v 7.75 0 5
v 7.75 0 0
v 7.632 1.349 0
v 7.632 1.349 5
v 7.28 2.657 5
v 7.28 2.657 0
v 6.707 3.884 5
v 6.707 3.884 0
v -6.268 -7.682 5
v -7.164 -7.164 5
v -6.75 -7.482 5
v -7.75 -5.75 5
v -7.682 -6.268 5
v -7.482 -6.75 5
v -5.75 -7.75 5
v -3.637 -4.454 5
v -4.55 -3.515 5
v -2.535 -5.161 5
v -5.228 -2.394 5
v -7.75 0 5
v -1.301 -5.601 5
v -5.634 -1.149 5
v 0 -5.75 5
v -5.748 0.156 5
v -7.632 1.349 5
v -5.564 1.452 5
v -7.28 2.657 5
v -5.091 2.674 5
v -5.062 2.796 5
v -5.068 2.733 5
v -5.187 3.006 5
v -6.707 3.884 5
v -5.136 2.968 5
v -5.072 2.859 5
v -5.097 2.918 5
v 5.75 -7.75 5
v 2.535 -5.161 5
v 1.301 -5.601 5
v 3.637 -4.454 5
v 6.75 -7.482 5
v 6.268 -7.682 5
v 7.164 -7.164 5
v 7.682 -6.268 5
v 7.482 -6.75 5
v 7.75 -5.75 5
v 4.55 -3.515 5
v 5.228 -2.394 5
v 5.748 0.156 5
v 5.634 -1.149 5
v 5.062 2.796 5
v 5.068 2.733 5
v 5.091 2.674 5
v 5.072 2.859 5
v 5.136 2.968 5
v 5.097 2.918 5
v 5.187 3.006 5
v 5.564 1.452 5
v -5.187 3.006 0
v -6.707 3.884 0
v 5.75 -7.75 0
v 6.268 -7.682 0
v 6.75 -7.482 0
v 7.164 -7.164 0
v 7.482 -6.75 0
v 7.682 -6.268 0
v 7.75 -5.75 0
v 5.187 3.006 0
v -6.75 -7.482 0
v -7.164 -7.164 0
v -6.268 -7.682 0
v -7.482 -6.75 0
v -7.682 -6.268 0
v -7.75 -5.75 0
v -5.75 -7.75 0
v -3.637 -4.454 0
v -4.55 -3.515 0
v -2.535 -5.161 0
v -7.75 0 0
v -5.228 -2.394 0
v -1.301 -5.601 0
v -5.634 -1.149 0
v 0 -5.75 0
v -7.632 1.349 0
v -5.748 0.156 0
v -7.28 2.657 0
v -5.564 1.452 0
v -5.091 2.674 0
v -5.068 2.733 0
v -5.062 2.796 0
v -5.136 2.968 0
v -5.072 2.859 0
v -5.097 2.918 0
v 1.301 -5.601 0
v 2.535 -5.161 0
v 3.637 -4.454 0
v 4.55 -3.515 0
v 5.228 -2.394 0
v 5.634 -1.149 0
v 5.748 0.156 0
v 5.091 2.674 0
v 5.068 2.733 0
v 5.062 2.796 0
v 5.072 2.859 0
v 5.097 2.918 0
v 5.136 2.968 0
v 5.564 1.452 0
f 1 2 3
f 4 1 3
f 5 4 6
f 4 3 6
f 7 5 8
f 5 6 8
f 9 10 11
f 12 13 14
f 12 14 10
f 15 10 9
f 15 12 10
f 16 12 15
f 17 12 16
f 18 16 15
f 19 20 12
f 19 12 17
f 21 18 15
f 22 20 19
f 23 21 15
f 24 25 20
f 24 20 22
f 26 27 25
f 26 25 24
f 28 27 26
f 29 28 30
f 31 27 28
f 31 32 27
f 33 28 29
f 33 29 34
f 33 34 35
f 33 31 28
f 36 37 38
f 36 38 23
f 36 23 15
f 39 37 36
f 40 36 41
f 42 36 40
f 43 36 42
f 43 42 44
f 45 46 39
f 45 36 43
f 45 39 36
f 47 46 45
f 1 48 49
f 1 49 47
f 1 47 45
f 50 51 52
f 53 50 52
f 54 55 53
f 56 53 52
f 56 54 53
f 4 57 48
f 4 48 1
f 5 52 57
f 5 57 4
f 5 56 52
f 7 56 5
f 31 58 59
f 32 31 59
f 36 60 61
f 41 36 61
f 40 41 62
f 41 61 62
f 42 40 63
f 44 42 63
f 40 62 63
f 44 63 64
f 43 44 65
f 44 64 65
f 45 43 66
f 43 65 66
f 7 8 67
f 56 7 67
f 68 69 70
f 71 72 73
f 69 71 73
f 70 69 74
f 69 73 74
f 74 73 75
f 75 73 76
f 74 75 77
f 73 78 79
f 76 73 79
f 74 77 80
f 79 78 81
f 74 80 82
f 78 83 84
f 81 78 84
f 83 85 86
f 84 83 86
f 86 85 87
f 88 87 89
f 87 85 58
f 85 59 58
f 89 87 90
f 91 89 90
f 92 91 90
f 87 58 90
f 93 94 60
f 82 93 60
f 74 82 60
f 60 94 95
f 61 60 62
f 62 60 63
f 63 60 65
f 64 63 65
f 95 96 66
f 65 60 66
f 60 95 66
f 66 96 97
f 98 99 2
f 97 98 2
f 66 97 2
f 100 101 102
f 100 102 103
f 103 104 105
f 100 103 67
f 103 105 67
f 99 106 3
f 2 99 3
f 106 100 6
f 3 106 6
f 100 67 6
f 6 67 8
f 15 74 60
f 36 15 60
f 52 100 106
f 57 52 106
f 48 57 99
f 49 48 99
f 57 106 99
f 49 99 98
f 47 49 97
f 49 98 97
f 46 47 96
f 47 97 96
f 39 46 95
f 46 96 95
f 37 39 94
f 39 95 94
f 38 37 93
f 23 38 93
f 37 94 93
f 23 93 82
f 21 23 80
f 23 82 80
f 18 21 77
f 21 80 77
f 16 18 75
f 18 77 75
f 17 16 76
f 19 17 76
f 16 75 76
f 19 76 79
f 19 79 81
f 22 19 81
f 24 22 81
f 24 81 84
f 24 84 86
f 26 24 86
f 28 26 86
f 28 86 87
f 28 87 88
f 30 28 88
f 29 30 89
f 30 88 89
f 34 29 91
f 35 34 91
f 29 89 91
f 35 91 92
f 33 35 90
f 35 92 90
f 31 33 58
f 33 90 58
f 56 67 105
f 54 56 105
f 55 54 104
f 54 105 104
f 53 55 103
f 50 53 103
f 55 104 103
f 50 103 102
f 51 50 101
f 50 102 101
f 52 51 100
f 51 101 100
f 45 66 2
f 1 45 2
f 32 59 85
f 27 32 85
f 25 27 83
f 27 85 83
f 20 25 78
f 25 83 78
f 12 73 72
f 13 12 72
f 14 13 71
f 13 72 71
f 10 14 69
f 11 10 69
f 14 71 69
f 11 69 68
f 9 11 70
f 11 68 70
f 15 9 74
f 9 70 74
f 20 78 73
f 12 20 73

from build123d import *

# Parameters (mm, degrees)
F1_DEPTH = 5


with BuildPart() as f1:
    # F0 (on Top) → F1 (new body)
    with BuildSketch(Plane.XY):
        with BuildLine():
            ThreePointArc((5.090661, 2.673513), (0, -5.75), (-5.090661, 2.673513))
            ThreePointArc((-5.090661, 2.673513), (-5.071855, 2.859275), (-5.186994, 3.006259))
            Line((-5.186994, 3.006259), (-6.706691, 3.883657))
            ThreePointArc((-6.706691, 3.883657), (-7.48463, 2.010677), (-7.75, 0))
            ThreePointArc((-7.75, 0), (-5.480078, -5.480078), (0, -7.75))
            ThreePointArc((0, -7.75), (5.480078, -5.480078), (7.75, 0))
            ThreePointArc((7.75, 0), (7.48463, 2.010677), (6.706691, 3.883657))
            Line((6.706691, 3.883657), (5.186994, 3.006259))
            ThreePointArc((5.186994, 3.006259), (5.071855, 2.859275), (5.090661, 2.673513))
        make_face()
        with BuildLine():
            ThreePointArc((0, -7.75), (-5.480078, -5.480078), (-7.75, 0))
            Line((-7.75, 0), (-7.75, -5.75))
            ThreePointArc((-7.75, -5.75), (-7.164214, -7.164214), (-5.75, -7.75))
            Line((-5.75, -7.75), (0, -7.75))
        make_face()
        with BuildLine():
            Line((7.75, -5.75), (7.75, 0))
            ThreePointArc((7.75, 0), (5.480078, -5.480078), (0, -7.75))
            Line((0, -7.75), (5.75, -7.75))
            ThreePointArc((5.75, -7.75), (7.164214, -7.164214), (7.75, -5.75))
        make_face()
    extrude(amount=F1_DEPTH)


solid = f1.part
